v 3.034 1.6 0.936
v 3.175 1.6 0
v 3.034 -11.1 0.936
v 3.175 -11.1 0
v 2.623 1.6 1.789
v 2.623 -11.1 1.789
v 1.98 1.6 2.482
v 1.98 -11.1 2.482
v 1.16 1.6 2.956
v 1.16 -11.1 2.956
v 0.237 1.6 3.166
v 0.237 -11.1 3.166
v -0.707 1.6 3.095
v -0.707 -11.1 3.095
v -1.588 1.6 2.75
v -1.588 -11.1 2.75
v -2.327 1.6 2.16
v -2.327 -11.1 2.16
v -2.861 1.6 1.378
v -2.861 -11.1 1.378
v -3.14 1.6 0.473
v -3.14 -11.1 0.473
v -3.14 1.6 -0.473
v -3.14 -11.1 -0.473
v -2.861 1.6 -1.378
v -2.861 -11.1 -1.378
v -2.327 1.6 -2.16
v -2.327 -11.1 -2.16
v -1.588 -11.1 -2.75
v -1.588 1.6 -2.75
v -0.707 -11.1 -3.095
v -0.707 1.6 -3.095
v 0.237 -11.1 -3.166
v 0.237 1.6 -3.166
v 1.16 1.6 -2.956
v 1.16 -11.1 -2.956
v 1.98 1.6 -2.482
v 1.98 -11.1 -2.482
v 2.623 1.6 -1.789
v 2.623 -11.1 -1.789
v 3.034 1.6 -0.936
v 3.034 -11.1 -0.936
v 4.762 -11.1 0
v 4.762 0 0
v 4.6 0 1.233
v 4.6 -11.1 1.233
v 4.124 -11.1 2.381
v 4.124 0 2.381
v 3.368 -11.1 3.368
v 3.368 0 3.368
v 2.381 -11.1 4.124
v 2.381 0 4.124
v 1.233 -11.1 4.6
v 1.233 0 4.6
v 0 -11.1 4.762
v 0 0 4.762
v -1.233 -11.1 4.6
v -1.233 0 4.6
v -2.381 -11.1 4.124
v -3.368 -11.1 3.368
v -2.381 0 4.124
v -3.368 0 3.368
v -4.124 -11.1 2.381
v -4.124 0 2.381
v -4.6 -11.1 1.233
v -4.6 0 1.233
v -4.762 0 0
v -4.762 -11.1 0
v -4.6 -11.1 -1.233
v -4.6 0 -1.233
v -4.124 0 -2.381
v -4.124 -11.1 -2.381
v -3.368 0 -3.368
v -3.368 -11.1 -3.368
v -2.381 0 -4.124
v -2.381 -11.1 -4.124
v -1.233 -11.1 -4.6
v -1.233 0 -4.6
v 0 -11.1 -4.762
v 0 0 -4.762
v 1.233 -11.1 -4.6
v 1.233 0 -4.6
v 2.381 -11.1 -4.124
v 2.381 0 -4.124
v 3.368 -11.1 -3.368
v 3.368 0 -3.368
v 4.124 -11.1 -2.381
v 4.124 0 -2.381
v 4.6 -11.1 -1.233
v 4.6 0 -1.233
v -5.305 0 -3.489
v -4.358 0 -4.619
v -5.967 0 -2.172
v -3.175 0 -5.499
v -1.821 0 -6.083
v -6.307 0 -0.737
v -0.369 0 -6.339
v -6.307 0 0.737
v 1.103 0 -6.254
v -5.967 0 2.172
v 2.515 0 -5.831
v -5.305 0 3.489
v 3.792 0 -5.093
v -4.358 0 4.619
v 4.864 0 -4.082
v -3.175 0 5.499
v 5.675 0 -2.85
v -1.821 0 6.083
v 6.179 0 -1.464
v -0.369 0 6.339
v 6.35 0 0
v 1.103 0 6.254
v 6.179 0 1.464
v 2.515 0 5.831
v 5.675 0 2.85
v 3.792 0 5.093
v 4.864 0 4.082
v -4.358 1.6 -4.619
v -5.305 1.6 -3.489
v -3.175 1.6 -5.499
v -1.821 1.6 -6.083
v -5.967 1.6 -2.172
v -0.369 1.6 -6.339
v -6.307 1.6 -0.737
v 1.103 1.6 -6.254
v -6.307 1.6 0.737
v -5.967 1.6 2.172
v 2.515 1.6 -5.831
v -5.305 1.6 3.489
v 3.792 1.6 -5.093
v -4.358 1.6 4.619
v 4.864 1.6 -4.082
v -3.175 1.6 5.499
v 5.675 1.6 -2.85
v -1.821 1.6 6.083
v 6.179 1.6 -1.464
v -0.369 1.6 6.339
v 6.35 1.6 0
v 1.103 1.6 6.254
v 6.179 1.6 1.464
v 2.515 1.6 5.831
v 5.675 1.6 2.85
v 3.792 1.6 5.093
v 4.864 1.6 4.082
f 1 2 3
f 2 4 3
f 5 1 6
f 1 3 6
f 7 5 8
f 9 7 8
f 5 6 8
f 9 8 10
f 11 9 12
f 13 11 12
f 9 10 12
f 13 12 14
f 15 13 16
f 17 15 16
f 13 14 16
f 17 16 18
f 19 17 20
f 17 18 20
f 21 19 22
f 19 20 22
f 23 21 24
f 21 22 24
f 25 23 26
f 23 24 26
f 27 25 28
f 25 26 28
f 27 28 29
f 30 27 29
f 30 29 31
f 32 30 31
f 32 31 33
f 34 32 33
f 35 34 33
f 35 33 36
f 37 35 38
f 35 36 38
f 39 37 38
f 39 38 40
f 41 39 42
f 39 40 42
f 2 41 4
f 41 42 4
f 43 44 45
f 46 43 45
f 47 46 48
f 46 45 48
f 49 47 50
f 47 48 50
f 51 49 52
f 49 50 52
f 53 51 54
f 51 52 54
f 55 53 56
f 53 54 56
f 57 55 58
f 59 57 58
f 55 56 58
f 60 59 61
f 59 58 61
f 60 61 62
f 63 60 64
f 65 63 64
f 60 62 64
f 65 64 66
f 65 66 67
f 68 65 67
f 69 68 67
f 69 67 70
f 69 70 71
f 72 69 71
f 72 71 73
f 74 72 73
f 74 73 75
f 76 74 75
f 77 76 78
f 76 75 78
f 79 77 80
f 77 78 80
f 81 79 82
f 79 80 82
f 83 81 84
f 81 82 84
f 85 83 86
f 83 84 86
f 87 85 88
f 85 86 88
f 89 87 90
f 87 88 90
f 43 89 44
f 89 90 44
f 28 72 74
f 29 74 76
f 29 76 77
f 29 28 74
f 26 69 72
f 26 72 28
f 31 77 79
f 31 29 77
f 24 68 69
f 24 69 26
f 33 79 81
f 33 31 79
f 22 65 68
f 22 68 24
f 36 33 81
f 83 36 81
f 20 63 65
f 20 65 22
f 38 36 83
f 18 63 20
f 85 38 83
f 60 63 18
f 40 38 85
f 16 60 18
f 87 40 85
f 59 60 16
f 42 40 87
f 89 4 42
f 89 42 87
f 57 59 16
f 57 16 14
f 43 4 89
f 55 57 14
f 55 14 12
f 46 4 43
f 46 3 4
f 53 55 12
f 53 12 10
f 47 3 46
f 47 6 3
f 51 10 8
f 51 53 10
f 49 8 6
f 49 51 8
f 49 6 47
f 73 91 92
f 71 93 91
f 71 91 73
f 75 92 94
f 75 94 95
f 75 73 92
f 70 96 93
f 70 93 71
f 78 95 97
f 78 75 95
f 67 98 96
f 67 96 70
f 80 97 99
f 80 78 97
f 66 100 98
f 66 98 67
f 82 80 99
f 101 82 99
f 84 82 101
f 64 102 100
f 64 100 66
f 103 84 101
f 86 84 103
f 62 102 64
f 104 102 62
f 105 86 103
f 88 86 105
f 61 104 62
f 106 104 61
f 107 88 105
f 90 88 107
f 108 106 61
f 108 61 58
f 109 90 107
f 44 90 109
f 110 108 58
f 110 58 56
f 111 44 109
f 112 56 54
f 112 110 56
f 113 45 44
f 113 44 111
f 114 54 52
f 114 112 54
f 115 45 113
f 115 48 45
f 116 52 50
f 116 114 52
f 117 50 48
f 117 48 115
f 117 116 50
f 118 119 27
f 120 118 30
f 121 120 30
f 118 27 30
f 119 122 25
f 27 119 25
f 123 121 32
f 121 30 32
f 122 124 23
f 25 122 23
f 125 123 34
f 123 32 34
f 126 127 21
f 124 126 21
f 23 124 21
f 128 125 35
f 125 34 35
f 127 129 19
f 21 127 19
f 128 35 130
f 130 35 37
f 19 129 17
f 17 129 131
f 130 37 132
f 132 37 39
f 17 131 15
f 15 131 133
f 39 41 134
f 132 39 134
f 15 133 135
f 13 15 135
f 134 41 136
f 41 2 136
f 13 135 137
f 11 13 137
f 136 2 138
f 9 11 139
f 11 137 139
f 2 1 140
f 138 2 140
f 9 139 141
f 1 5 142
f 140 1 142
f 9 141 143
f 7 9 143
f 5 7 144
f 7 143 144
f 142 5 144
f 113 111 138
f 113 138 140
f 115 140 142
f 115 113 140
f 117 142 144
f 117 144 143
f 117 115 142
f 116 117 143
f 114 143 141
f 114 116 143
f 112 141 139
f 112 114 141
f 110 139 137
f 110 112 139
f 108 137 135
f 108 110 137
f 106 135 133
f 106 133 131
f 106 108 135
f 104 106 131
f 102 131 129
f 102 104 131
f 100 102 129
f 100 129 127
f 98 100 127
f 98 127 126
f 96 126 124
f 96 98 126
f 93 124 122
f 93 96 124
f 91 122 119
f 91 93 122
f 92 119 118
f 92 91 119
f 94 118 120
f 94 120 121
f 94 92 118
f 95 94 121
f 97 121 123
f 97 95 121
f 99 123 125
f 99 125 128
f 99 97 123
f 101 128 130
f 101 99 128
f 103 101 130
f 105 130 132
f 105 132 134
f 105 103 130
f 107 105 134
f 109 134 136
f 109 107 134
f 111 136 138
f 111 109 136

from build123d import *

# Parameters (mm, degrees)
F0_R     = 6.35
F1_DEPTH = 1.6002
F2_R     = 4.7625
F3_DEPTH = 11.0998
F4_R     = 3.175
F5_DEPTH = 19.05


with BuildPart() as f1:
    # F0 (on Front) → F1 (new body)
    with BuildSketch(Plane.XZ):
        Circle(F0_R)
    extrude(amount=-F1_DEPTH)

    # F2 (on face) → F3 (join)
    with BuildSketch(Plane.XZ):
        Circle(F2_R)
    extrude(amount=F3_DEPTH)

    # F4 (on face) → F5 (cut, symmetric)
    with BuildSketch(Plane.XZ):
        Circle(F4_R)
    extrude(amount=F5_DEPTH, both=True, mode=Mode.SUBTRACT)


solid = f1.part
